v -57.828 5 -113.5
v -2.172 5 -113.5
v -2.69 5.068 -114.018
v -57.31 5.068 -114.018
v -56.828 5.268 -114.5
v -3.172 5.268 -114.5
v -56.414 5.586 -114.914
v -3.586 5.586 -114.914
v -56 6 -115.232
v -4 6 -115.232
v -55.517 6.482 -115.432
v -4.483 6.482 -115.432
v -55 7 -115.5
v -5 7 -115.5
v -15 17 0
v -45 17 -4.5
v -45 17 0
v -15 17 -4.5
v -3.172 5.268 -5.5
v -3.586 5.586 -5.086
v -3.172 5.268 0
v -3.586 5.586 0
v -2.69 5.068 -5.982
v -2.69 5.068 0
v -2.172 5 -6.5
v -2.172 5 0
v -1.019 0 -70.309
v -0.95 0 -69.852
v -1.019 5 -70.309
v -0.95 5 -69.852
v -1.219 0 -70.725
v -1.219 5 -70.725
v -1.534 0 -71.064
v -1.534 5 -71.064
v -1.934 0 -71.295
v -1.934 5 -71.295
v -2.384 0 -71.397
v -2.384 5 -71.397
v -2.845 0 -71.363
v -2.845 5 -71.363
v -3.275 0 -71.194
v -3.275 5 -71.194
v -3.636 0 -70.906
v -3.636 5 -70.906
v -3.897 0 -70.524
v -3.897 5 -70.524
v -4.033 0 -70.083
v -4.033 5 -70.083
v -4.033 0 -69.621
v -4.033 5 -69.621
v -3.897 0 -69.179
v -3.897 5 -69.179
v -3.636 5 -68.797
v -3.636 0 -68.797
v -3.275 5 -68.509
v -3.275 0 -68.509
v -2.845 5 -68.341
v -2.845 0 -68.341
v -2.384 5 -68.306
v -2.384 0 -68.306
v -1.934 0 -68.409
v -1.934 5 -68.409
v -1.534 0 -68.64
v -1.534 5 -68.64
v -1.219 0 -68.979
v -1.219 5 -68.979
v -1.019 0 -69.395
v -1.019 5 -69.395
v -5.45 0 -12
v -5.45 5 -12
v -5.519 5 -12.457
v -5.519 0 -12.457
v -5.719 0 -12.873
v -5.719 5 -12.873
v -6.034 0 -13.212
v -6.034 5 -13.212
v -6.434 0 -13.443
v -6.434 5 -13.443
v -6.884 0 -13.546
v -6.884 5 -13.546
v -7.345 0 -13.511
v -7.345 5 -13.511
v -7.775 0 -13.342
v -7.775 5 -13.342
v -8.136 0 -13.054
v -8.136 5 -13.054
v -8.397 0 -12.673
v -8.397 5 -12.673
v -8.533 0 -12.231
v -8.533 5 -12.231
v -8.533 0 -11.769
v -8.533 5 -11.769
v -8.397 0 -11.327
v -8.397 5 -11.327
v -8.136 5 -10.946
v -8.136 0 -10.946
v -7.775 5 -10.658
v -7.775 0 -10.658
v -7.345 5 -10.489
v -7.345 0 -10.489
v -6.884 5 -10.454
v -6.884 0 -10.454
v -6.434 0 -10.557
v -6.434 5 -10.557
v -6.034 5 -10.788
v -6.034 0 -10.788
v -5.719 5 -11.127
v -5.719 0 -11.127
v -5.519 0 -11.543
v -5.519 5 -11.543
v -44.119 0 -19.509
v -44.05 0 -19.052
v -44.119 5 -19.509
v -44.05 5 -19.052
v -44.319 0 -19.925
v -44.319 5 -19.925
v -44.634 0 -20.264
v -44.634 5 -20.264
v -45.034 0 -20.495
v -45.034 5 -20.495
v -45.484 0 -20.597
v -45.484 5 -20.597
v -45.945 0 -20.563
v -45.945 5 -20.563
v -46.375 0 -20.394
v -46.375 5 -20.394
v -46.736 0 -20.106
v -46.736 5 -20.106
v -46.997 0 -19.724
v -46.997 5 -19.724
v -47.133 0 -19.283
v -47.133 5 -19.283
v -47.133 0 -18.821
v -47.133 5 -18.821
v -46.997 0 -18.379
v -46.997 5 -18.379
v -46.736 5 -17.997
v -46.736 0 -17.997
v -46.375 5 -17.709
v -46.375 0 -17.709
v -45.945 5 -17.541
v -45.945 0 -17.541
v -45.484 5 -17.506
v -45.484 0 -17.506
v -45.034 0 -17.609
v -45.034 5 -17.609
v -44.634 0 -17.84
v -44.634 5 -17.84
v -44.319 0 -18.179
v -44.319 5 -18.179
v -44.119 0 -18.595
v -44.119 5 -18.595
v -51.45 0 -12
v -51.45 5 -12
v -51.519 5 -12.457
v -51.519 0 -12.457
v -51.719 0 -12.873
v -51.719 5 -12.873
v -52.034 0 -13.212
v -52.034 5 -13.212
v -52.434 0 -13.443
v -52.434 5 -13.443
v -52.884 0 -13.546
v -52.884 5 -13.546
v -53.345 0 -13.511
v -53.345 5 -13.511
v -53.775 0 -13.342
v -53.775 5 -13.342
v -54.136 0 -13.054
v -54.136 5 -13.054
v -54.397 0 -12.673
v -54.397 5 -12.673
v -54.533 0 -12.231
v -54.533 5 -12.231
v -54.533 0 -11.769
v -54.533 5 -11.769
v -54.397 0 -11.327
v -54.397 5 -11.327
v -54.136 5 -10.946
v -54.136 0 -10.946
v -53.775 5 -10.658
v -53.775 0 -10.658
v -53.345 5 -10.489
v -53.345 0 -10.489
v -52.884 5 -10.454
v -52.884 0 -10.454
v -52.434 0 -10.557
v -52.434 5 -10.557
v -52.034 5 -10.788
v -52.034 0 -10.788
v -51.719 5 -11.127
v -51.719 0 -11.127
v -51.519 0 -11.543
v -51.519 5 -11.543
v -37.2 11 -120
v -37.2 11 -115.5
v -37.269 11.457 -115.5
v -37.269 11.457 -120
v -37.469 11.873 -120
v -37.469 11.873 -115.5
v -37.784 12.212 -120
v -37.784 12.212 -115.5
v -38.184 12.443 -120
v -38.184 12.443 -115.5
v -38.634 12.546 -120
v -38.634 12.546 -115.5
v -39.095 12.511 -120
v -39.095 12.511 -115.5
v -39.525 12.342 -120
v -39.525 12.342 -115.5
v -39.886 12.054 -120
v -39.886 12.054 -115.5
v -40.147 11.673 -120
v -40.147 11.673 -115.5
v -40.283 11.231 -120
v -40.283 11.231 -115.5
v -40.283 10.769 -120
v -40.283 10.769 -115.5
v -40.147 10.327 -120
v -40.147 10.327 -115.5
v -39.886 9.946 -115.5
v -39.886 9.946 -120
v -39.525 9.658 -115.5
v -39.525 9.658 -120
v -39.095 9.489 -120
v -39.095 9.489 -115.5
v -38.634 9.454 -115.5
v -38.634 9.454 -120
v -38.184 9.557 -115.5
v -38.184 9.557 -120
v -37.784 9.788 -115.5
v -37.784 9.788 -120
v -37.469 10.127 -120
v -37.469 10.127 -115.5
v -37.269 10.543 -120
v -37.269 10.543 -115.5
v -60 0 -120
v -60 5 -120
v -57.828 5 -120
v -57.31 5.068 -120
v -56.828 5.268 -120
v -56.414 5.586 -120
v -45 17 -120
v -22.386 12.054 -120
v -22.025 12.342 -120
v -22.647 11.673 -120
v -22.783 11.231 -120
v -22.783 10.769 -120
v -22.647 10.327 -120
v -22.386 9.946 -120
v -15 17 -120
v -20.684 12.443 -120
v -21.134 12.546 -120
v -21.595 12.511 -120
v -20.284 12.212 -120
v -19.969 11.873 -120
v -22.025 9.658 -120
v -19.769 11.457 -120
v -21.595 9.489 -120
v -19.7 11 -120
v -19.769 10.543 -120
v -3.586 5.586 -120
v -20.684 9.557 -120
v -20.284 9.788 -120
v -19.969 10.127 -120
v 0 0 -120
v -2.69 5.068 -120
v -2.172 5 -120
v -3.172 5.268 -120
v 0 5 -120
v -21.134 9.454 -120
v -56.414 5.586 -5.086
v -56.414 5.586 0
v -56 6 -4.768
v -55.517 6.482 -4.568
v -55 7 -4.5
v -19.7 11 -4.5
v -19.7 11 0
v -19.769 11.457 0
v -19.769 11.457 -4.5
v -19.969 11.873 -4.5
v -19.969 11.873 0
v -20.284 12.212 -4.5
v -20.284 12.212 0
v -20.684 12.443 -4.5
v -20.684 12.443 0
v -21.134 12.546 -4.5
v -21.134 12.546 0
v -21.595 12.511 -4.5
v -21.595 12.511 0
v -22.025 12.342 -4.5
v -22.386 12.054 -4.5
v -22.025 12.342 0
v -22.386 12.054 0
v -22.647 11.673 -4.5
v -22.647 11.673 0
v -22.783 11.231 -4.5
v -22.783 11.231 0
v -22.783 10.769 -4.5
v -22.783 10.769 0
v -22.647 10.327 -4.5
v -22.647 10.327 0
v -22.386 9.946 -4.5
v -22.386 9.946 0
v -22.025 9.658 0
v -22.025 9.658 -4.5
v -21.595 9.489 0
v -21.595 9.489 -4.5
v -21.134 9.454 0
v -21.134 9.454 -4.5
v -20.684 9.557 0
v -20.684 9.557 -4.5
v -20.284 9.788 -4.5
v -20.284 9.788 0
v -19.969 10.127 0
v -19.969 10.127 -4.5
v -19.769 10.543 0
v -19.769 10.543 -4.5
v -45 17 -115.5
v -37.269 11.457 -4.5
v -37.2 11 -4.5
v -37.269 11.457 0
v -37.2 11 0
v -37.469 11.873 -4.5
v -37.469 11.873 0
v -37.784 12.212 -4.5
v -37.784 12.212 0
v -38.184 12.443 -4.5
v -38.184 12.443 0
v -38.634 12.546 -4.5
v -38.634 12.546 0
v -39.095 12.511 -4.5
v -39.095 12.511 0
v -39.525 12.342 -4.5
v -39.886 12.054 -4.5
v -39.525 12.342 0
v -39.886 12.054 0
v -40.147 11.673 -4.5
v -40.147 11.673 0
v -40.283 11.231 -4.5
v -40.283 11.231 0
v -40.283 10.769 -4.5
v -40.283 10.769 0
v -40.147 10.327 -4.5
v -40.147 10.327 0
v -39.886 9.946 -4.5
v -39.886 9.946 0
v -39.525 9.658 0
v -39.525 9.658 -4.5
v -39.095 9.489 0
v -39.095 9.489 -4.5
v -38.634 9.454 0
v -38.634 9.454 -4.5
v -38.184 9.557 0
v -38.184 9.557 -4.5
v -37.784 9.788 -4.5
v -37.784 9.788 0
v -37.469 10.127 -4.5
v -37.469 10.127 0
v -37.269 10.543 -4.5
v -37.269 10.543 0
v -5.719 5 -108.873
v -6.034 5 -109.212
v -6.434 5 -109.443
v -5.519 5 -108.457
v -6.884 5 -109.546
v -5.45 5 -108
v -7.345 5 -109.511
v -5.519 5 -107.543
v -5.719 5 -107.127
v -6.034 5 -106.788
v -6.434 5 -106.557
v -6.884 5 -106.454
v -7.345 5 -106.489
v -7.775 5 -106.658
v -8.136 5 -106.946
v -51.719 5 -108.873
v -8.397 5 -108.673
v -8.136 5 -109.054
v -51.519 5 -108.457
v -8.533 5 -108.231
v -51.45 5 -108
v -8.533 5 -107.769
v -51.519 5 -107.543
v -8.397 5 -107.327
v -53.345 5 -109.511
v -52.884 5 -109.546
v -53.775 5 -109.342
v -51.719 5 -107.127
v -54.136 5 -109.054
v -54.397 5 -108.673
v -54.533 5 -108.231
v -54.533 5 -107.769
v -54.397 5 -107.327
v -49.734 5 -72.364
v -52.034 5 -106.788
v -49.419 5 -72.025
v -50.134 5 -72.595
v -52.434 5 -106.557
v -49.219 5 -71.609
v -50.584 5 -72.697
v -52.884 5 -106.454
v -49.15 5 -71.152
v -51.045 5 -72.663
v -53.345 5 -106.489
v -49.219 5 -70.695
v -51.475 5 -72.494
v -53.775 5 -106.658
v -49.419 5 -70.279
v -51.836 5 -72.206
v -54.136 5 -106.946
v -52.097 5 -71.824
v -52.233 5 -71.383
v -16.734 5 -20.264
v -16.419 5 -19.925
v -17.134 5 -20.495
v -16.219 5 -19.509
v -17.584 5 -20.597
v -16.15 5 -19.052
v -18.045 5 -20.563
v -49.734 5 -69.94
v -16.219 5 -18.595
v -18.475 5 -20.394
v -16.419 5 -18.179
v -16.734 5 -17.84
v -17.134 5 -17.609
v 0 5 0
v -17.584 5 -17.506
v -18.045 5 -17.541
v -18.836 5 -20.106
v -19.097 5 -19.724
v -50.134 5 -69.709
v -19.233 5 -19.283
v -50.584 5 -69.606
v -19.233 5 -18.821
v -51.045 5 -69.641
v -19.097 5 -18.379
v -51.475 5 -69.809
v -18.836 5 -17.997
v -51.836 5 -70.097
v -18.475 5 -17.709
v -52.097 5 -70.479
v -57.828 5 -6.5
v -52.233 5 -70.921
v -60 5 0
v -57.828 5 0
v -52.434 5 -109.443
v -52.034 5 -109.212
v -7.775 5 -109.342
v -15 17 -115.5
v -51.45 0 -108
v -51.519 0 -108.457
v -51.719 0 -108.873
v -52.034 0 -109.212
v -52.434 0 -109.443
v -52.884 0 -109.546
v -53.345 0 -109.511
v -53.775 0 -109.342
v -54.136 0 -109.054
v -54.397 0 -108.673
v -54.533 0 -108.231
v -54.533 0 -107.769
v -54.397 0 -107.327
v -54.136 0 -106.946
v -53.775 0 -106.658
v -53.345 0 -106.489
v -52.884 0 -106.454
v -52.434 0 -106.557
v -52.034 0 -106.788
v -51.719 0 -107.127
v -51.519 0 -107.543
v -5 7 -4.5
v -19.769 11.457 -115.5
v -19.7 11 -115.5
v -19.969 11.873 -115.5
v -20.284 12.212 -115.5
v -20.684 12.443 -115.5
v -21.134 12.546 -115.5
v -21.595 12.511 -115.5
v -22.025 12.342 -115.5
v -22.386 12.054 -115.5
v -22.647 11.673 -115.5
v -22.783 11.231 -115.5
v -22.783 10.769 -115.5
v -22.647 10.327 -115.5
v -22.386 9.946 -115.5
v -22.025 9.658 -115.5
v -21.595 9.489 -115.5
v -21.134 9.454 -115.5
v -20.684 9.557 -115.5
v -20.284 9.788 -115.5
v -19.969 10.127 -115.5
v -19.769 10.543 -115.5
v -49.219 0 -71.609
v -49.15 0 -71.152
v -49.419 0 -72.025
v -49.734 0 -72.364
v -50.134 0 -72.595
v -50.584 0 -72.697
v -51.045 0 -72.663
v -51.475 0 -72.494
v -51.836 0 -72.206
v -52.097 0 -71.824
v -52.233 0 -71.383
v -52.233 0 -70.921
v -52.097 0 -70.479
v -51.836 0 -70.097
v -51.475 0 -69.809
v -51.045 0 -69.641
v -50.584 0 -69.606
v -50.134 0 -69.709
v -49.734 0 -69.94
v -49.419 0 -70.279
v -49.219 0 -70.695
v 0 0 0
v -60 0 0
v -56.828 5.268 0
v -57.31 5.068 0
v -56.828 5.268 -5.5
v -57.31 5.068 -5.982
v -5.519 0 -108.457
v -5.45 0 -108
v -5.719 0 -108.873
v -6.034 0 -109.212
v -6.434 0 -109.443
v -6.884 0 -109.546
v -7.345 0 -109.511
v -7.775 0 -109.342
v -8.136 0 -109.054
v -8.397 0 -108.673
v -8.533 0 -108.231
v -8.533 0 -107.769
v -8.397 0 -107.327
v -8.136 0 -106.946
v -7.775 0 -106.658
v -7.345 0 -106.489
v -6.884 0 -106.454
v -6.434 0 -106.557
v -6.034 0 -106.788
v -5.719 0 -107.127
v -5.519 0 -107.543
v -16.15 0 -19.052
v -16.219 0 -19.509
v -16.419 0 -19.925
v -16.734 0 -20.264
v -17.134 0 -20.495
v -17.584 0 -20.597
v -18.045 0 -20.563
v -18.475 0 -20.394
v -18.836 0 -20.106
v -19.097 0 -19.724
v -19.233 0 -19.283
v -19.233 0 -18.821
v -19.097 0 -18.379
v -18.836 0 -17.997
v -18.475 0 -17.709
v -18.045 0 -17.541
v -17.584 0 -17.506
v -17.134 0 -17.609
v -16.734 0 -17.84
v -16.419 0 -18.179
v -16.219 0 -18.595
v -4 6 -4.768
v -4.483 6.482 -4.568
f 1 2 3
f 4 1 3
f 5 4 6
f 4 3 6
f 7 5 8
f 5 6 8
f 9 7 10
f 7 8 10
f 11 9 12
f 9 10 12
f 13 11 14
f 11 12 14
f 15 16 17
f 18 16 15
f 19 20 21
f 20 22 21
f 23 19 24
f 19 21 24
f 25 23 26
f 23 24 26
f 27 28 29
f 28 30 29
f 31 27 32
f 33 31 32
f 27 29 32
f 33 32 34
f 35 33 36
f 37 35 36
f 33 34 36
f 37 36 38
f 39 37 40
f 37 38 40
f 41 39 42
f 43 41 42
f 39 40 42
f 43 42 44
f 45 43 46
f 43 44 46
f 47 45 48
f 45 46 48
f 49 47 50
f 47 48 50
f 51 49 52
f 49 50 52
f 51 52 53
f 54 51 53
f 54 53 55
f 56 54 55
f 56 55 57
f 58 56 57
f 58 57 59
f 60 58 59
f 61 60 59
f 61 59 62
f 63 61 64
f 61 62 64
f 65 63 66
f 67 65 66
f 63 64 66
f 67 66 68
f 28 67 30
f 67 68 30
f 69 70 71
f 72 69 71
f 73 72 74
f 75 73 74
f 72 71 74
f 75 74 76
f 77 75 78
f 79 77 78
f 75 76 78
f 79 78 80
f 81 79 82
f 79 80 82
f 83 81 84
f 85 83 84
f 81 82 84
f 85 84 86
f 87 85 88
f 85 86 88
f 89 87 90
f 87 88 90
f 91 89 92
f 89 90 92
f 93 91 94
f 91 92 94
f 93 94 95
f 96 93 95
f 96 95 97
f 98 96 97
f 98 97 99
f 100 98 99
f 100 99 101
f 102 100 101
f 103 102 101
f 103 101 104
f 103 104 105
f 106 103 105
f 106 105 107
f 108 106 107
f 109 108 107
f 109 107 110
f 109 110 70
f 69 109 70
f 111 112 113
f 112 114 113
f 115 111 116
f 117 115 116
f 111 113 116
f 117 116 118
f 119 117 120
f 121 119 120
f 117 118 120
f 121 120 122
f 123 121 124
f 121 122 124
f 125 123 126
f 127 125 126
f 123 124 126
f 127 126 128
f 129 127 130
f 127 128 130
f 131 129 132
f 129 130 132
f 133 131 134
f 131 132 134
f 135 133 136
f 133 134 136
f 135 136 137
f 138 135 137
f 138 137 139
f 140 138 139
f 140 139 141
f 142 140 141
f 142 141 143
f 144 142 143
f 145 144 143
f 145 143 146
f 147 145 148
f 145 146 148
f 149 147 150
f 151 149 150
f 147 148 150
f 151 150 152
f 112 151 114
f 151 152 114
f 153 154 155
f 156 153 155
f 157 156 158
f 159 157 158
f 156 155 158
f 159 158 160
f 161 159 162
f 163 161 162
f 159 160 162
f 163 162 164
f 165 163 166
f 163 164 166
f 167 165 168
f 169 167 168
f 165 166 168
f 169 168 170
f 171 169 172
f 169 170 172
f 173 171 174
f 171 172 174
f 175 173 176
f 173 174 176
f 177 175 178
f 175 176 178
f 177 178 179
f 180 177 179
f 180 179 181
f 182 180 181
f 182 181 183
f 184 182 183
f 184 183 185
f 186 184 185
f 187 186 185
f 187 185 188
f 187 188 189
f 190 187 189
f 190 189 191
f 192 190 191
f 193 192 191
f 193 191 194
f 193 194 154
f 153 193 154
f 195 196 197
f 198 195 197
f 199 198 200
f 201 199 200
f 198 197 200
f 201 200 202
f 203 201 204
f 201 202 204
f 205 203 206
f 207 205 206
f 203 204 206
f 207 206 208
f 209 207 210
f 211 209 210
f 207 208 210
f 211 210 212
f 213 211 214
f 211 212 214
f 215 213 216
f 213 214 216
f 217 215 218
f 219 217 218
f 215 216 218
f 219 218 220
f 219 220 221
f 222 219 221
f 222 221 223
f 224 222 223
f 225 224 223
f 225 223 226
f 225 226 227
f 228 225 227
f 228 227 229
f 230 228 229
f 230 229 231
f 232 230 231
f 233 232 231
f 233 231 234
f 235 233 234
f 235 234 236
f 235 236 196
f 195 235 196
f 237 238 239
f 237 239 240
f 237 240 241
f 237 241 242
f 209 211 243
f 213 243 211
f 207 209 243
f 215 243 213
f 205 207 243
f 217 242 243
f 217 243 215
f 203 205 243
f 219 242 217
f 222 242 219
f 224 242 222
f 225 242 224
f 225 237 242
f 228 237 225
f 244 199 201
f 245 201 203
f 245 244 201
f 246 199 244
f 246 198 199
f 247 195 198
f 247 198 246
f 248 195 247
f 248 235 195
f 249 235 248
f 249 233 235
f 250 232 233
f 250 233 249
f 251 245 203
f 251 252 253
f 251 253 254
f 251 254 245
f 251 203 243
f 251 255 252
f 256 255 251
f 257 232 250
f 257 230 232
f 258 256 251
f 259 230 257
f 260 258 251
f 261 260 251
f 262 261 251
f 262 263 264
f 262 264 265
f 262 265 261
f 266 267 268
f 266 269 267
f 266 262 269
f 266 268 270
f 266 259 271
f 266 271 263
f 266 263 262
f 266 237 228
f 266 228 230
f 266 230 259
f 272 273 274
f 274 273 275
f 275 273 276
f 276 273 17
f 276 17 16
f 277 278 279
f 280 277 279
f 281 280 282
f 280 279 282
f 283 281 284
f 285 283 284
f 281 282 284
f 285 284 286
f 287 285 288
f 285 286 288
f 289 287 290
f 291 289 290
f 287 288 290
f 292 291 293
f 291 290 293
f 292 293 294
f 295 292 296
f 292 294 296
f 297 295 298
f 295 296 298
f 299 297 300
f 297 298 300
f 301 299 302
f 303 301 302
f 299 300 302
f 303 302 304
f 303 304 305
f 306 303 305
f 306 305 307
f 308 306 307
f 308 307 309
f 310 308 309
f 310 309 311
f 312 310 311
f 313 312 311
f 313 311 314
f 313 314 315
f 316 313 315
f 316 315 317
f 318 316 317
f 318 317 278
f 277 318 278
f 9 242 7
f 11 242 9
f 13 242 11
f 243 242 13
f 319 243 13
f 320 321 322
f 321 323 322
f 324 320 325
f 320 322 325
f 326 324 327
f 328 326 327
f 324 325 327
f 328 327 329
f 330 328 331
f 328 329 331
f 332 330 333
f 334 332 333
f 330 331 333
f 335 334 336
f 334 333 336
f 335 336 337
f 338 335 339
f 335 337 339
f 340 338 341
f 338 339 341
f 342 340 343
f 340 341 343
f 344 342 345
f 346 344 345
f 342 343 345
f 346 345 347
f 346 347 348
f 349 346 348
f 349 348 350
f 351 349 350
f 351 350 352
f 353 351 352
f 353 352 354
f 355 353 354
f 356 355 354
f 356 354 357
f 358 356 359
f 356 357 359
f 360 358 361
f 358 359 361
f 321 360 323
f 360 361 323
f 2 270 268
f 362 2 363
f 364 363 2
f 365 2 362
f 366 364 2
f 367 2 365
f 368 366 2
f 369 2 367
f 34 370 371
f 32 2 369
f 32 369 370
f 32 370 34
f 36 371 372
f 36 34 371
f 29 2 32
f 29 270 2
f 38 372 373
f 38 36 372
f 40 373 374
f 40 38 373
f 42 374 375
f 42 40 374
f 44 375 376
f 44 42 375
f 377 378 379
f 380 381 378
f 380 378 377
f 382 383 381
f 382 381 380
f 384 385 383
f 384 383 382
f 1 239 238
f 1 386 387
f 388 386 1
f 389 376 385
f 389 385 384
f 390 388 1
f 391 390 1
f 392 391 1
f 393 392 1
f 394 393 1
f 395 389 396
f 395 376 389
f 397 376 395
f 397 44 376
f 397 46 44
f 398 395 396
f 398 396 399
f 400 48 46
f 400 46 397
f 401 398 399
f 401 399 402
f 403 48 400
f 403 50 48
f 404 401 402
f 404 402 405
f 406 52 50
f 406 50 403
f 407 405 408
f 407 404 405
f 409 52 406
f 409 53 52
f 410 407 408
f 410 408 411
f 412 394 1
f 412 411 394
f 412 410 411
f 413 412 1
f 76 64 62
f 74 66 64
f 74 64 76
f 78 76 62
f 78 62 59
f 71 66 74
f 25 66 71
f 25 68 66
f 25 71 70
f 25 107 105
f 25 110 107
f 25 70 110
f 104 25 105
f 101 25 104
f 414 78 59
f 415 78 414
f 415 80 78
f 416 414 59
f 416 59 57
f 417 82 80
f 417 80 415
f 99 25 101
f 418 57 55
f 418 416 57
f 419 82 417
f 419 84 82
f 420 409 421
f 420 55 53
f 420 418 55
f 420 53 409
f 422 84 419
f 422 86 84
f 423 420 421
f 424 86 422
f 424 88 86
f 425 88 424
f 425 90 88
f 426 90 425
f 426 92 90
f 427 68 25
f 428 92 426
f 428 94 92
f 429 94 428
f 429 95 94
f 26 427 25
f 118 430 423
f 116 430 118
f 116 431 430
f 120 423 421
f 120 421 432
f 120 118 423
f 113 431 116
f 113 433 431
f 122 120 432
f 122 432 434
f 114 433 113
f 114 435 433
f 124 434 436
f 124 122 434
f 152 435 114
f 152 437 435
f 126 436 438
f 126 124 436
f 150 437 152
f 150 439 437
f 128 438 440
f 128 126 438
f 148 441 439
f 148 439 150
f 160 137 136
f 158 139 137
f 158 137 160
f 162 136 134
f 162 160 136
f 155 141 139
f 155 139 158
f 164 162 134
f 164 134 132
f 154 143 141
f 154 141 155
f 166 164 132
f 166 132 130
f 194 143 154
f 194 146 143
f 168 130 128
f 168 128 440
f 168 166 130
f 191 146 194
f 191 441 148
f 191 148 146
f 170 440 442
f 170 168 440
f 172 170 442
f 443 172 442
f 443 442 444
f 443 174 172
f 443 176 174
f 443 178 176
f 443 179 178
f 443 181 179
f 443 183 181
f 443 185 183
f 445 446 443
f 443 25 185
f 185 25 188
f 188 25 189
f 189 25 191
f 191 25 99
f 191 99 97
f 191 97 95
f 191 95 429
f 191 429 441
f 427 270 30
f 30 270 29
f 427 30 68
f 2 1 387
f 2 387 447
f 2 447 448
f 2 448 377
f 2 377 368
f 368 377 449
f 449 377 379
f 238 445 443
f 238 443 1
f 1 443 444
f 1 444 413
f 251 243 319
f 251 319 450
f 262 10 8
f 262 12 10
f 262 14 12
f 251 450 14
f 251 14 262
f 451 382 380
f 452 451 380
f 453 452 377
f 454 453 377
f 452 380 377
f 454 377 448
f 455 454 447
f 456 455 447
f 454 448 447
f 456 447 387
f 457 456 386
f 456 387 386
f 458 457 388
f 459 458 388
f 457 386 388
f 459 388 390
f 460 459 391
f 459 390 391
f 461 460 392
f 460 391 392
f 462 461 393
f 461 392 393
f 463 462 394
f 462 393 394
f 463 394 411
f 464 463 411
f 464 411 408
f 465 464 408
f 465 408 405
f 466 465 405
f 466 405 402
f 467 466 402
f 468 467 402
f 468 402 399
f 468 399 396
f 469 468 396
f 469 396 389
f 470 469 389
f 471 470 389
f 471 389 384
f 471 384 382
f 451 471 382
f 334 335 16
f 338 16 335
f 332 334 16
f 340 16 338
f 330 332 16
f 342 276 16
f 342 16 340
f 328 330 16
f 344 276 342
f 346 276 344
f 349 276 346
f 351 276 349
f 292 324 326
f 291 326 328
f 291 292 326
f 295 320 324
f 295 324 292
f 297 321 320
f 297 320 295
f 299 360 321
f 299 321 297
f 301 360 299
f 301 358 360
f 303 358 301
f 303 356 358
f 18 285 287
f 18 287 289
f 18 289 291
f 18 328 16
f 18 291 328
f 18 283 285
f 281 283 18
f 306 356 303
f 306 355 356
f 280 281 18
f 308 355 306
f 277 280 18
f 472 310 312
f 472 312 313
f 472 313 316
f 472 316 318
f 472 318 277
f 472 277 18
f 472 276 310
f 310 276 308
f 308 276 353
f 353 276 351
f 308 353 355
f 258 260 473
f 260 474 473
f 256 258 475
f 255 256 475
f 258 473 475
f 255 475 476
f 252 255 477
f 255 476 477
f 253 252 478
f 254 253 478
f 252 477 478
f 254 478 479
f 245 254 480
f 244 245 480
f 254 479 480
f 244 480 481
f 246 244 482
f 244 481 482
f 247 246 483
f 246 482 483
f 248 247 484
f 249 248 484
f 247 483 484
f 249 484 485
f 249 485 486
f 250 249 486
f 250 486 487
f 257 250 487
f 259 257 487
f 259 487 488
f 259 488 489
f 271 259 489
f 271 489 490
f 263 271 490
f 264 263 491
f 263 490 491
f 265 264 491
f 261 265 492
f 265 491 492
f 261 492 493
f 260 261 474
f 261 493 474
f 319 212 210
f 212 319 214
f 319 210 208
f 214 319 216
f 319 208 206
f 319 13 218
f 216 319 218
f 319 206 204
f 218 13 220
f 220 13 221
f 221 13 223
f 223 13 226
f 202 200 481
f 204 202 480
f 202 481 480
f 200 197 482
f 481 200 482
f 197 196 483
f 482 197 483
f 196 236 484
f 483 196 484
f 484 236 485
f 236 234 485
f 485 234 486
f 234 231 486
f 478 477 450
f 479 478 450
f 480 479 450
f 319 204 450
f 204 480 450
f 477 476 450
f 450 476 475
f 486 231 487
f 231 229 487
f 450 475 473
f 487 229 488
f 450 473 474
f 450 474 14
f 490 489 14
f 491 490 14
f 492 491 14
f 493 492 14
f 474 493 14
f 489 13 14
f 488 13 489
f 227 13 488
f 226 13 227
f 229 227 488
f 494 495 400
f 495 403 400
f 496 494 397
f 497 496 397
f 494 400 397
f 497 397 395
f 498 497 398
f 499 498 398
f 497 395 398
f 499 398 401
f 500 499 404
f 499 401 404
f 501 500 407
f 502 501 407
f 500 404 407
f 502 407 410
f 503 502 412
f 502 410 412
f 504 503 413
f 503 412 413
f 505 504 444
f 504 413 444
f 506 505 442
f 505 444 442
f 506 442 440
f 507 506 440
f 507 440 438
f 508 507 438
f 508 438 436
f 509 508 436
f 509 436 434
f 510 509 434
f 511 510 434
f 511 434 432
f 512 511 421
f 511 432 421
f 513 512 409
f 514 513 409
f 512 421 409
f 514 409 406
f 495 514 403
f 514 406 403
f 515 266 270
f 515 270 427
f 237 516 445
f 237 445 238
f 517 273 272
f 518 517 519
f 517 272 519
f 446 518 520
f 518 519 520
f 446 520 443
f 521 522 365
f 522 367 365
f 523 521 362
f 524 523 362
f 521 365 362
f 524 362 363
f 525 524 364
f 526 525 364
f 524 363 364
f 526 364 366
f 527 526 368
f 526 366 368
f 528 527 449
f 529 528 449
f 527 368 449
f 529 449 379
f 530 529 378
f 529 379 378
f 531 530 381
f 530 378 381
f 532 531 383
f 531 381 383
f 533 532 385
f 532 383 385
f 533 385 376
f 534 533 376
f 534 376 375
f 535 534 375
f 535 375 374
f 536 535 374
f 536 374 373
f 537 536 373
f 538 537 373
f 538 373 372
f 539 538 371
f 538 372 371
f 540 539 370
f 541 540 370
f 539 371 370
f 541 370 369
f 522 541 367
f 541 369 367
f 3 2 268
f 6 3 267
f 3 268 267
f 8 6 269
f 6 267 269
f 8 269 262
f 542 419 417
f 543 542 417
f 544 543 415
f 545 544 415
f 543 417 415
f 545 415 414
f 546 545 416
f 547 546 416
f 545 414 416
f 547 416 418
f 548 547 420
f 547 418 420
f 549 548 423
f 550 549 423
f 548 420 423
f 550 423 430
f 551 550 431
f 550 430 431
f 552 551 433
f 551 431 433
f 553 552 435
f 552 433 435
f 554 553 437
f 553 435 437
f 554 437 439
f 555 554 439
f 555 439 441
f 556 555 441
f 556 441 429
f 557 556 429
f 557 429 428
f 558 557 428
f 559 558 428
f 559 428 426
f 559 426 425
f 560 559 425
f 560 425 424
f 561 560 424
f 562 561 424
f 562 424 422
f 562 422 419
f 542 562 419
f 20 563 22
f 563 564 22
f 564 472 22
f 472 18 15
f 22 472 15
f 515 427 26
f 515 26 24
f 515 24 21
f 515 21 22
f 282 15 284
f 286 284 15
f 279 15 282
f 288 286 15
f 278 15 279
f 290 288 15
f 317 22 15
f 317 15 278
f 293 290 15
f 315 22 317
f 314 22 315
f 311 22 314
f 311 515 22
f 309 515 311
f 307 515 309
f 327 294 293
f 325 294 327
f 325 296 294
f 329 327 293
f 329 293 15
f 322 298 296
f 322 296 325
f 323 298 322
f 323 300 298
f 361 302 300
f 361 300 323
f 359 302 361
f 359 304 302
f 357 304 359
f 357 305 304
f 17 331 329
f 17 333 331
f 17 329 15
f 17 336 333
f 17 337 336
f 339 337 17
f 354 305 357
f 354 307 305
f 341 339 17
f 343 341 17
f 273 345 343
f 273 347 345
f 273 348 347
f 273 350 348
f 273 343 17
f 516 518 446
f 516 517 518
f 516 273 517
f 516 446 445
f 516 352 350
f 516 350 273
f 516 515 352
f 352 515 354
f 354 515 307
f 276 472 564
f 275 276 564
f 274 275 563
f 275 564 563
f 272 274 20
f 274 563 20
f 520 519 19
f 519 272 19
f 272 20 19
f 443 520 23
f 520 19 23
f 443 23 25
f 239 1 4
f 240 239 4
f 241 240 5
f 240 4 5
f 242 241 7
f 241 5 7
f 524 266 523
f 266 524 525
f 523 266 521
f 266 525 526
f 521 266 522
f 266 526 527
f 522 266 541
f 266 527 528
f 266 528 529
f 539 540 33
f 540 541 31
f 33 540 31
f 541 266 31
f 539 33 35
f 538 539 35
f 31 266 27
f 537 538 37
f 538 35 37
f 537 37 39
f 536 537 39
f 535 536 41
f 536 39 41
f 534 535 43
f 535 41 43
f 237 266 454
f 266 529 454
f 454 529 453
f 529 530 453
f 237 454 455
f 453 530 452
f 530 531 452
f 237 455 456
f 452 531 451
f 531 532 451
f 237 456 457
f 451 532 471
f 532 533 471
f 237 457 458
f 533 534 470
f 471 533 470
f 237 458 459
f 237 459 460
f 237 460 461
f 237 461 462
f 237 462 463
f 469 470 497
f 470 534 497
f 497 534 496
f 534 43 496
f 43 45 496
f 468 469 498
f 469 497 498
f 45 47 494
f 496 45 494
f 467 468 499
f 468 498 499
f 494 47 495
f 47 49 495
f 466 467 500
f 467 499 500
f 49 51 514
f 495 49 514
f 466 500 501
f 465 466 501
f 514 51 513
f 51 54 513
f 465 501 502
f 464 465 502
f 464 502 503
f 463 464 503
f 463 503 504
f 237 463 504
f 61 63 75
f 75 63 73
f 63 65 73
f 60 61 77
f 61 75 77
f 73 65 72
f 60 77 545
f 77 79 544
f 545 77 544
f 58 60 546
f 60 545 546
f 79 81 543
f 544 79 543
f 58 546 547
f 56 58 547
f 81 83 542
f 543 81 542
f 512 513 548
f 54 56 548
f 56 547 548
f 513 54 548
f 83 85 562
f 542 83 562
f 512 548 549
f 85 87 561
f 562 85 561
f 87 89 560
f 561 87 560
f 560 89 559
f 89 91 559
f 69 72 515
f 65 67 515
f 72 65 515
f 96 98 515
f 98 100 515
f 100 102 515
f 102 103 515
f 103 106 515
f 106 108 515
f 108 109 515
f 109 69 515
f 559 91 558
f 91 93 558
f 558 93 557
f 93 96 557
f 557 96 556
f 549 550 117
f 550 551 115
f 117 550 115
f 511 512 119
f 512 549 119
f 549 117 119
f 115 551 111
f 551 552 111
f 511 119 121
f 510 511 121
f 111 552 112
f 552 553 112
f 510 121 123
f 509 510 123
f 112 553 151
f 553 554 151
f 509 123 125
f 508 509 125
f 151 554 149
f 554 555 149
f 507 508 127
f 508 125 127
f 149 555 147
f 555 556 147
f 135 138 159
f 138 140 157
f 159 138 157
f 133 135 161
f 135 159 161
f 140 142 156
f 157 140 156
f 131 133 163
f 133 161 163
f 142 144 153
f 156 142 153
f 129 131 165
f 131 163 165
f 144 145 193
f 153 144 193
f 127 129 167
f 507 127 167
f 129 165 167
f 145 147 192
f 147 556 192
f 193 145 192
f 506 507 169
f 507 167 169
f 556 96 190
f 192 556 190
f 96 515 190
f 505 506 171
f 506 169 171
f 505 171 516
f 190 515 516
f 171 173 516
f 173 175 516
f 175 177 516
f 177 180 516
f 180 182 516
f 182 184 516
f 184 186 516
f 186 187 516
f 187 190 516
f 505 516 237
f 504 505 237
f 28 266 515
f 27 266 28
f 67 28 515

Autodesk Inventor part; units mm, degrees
ref_plane "YZ Plane" through (0, 0, 0) normal (1, 0, 0) x (0, 1, 0)
ref_plane "XZ Plane" through (0, 0, 0) normal (0, 1, 0) x (-1, 0, 0)
ref_plane "XY Plane" through (0, 0, 0) normal (0, 0, 1) x (1, 0, 0)
sketch "Sketch1" plane through (0, 0, 0) normal (0, 1, 0) x (-1, 0, 0)
  line L0 (0, 0) -> (60, 0)
  line L1 (60, 0) -> (60, -120)
  line L2 (60, -120) -> (0, -120)
  line L3 (0, -120) -> (0, 0)
  dimension "d0" = 60
  dimension "d1" = 120
extrude "Extrusion1" add sketch "Sketch1" along normal blind 5
sketch "Sketch2" plane through (0, 5, 0) normal (0, 1, 0) x (1, 0, 0)
  line L0 (-30, 120) -> (-45, 120)
  line L1 (-30, 120) -> (-15, 120)
  line L2 (-45, 120) -> (-45, 115.5)
  line L3 (-45, 115.5) -> (-15, 115.5)
  line L4 (-15, 115.5) -> (-15, 120)
  line L5 (-15, 120) -> (-45, 120)
  line L6 (-60, 120) -> (-60, 0) projected
  line L7 (0, 0) -> (0, 120) projected
  line L8 (-30, 0) -> (-45, 0)
  line L9 (-30, 0) -> (-15, 0)
  line L10 (-45, 0) -> (-45, 4.5)
  line L11 (-45, 4.5) -> (-15, 4.5)
  line L12 (-15, 4.5) -> (-15, 0)
  line L13 (-45, 0) -> (-15, 0)
  line L14 (-60, 0) -> (0, 0) projected
  dimension "d9" = 15
  dimension "d10" = 15
  dimension "d12" = 4.5
extrude "Extrusion2" add sketch "Sketch2" along normal blind 12
chamfer "Chamfer1" distance 12 angle 45 4 edges at (-45, 5, -2.25) (-45, 5, -117.75) (-15, 5, -2.25) (-15, 5, -117.75)
fillet "Fillet1" radius 2 6 edges at (-30, 5, -115.5) (-56.9995, 5, -117.75) (-56.9995, 5, -2.25) (-30, 5, -4.5) (-3.0005, 5, -2.25) (-3.0005, 5, -117.75)
sketch "Sketch3" plane through (-60, 0, 0) normal (0, 0, 1) x (1, 0, 0)
  line L0 (0, 0) -> (60, 0) projected
  circle A0 centre (38.75, 11) radius 1.55
  circle A1 centre (21.25, 11) radius 1.55
  dimension "d22" = 3.1
  dimension "d23" = 3.1
  dimension "d25" = 17.5
  dimension "d26" = 11
  dimension "d27" = 11
extrude "Extrusion3" cut sketch "Sketch3" against normal through all
sketch "Sketch4" plane through (0, 5, 0) normal (0, 1, 0) x (1, 0, 0)
  line L0 (0, 0) -> (0, 120) projected
  line L1 (0, 50.8517) -> (-60, 50.8517)
  line L2 (-60, 120) -> (-60, 0) projected
  line L3 (-26.65, 16.5517) -> (0, 16.5517)
  line L4 (0, 16.5517) -> (0, 85.1517)
  line L5 (0, 85.1517) -> (-53.3, 85.1517)
  line L6 (-53.3, 85.1517) -> (-53.3, 16.5517)
  line L7 (-53.3, 16.5517) -> (-26.65, 16.5517)
  line L8 (0, 85.1517) -> (0, 84.5517)
  line L9 (0, 85.1517) -> (0, 69.8517)
  circle A0 centre (-2.5, 69.8517) radius 1.55
  line L10 (-26.65, 85.1517) -> (-26.65, 16.5517)
  circle A1 centre (-50.7, 71.1517) radius 1.55
  circle A2 centre (-17.7, 19.0517) radius 1.55
  circle A3 centre (-45.6, 19.0517) radius 1.55
  line L11 (0, 85.1517) -> (-2, 85.1517)
  dimension "d34" = 53.3
  dimension "d35" = 68.6
  dimension "d39" = 3.1
  dimension "d43" = 3.1
  dimension "d44" = 3.1
  dimension "d55" = 14
  dimension "d56" = 1.3
  dimension "d57" = 50.8
  dimension "d58" = 15.2
  dimension "d59" = 27.9
extrude "Extrusion4" cut sketch "Sketch4" against normal blind 12 contours A0 | A1 | A2 | A3
sketch "Sketch5" plane through (0, 5, 0) normal (0, 1, 0) x (1, 0, 0)
  line L0 (0, 0) -> (0, 120) projected
  line L1 (0, 120) -> (0, 108)
  line L2 (0, 108) -> (-7, 108)
  line L3 (-60, 120) -> (-60, 0) projected
  circle A0 centre (-7, 108) radius 1.55
  line L4 (0, 120) -> (-60, 120) projected
  line L5 (-30, 120) -> (-30, 0)
  line L6 (-45, 0) -> (-15, 0) projected
  line L7 (0, 60) -> (-60, 60)
  circle A1 centre (-53, 108) radius 1.55
  circle A2 centre (-7, 12) radius 1.55
  circle A3 centre (-53, 12) radius 1.55
  dimension "d47" = 12
  dimension "d48" = 7
  dimension "d49" = 3.1
extrude "Extrusion5" cut sketch "Sketch5" against normal blind 10 contours A0 | A1 | A2 | A3
properties part number "bottom_plate" material "PET Plastic"
